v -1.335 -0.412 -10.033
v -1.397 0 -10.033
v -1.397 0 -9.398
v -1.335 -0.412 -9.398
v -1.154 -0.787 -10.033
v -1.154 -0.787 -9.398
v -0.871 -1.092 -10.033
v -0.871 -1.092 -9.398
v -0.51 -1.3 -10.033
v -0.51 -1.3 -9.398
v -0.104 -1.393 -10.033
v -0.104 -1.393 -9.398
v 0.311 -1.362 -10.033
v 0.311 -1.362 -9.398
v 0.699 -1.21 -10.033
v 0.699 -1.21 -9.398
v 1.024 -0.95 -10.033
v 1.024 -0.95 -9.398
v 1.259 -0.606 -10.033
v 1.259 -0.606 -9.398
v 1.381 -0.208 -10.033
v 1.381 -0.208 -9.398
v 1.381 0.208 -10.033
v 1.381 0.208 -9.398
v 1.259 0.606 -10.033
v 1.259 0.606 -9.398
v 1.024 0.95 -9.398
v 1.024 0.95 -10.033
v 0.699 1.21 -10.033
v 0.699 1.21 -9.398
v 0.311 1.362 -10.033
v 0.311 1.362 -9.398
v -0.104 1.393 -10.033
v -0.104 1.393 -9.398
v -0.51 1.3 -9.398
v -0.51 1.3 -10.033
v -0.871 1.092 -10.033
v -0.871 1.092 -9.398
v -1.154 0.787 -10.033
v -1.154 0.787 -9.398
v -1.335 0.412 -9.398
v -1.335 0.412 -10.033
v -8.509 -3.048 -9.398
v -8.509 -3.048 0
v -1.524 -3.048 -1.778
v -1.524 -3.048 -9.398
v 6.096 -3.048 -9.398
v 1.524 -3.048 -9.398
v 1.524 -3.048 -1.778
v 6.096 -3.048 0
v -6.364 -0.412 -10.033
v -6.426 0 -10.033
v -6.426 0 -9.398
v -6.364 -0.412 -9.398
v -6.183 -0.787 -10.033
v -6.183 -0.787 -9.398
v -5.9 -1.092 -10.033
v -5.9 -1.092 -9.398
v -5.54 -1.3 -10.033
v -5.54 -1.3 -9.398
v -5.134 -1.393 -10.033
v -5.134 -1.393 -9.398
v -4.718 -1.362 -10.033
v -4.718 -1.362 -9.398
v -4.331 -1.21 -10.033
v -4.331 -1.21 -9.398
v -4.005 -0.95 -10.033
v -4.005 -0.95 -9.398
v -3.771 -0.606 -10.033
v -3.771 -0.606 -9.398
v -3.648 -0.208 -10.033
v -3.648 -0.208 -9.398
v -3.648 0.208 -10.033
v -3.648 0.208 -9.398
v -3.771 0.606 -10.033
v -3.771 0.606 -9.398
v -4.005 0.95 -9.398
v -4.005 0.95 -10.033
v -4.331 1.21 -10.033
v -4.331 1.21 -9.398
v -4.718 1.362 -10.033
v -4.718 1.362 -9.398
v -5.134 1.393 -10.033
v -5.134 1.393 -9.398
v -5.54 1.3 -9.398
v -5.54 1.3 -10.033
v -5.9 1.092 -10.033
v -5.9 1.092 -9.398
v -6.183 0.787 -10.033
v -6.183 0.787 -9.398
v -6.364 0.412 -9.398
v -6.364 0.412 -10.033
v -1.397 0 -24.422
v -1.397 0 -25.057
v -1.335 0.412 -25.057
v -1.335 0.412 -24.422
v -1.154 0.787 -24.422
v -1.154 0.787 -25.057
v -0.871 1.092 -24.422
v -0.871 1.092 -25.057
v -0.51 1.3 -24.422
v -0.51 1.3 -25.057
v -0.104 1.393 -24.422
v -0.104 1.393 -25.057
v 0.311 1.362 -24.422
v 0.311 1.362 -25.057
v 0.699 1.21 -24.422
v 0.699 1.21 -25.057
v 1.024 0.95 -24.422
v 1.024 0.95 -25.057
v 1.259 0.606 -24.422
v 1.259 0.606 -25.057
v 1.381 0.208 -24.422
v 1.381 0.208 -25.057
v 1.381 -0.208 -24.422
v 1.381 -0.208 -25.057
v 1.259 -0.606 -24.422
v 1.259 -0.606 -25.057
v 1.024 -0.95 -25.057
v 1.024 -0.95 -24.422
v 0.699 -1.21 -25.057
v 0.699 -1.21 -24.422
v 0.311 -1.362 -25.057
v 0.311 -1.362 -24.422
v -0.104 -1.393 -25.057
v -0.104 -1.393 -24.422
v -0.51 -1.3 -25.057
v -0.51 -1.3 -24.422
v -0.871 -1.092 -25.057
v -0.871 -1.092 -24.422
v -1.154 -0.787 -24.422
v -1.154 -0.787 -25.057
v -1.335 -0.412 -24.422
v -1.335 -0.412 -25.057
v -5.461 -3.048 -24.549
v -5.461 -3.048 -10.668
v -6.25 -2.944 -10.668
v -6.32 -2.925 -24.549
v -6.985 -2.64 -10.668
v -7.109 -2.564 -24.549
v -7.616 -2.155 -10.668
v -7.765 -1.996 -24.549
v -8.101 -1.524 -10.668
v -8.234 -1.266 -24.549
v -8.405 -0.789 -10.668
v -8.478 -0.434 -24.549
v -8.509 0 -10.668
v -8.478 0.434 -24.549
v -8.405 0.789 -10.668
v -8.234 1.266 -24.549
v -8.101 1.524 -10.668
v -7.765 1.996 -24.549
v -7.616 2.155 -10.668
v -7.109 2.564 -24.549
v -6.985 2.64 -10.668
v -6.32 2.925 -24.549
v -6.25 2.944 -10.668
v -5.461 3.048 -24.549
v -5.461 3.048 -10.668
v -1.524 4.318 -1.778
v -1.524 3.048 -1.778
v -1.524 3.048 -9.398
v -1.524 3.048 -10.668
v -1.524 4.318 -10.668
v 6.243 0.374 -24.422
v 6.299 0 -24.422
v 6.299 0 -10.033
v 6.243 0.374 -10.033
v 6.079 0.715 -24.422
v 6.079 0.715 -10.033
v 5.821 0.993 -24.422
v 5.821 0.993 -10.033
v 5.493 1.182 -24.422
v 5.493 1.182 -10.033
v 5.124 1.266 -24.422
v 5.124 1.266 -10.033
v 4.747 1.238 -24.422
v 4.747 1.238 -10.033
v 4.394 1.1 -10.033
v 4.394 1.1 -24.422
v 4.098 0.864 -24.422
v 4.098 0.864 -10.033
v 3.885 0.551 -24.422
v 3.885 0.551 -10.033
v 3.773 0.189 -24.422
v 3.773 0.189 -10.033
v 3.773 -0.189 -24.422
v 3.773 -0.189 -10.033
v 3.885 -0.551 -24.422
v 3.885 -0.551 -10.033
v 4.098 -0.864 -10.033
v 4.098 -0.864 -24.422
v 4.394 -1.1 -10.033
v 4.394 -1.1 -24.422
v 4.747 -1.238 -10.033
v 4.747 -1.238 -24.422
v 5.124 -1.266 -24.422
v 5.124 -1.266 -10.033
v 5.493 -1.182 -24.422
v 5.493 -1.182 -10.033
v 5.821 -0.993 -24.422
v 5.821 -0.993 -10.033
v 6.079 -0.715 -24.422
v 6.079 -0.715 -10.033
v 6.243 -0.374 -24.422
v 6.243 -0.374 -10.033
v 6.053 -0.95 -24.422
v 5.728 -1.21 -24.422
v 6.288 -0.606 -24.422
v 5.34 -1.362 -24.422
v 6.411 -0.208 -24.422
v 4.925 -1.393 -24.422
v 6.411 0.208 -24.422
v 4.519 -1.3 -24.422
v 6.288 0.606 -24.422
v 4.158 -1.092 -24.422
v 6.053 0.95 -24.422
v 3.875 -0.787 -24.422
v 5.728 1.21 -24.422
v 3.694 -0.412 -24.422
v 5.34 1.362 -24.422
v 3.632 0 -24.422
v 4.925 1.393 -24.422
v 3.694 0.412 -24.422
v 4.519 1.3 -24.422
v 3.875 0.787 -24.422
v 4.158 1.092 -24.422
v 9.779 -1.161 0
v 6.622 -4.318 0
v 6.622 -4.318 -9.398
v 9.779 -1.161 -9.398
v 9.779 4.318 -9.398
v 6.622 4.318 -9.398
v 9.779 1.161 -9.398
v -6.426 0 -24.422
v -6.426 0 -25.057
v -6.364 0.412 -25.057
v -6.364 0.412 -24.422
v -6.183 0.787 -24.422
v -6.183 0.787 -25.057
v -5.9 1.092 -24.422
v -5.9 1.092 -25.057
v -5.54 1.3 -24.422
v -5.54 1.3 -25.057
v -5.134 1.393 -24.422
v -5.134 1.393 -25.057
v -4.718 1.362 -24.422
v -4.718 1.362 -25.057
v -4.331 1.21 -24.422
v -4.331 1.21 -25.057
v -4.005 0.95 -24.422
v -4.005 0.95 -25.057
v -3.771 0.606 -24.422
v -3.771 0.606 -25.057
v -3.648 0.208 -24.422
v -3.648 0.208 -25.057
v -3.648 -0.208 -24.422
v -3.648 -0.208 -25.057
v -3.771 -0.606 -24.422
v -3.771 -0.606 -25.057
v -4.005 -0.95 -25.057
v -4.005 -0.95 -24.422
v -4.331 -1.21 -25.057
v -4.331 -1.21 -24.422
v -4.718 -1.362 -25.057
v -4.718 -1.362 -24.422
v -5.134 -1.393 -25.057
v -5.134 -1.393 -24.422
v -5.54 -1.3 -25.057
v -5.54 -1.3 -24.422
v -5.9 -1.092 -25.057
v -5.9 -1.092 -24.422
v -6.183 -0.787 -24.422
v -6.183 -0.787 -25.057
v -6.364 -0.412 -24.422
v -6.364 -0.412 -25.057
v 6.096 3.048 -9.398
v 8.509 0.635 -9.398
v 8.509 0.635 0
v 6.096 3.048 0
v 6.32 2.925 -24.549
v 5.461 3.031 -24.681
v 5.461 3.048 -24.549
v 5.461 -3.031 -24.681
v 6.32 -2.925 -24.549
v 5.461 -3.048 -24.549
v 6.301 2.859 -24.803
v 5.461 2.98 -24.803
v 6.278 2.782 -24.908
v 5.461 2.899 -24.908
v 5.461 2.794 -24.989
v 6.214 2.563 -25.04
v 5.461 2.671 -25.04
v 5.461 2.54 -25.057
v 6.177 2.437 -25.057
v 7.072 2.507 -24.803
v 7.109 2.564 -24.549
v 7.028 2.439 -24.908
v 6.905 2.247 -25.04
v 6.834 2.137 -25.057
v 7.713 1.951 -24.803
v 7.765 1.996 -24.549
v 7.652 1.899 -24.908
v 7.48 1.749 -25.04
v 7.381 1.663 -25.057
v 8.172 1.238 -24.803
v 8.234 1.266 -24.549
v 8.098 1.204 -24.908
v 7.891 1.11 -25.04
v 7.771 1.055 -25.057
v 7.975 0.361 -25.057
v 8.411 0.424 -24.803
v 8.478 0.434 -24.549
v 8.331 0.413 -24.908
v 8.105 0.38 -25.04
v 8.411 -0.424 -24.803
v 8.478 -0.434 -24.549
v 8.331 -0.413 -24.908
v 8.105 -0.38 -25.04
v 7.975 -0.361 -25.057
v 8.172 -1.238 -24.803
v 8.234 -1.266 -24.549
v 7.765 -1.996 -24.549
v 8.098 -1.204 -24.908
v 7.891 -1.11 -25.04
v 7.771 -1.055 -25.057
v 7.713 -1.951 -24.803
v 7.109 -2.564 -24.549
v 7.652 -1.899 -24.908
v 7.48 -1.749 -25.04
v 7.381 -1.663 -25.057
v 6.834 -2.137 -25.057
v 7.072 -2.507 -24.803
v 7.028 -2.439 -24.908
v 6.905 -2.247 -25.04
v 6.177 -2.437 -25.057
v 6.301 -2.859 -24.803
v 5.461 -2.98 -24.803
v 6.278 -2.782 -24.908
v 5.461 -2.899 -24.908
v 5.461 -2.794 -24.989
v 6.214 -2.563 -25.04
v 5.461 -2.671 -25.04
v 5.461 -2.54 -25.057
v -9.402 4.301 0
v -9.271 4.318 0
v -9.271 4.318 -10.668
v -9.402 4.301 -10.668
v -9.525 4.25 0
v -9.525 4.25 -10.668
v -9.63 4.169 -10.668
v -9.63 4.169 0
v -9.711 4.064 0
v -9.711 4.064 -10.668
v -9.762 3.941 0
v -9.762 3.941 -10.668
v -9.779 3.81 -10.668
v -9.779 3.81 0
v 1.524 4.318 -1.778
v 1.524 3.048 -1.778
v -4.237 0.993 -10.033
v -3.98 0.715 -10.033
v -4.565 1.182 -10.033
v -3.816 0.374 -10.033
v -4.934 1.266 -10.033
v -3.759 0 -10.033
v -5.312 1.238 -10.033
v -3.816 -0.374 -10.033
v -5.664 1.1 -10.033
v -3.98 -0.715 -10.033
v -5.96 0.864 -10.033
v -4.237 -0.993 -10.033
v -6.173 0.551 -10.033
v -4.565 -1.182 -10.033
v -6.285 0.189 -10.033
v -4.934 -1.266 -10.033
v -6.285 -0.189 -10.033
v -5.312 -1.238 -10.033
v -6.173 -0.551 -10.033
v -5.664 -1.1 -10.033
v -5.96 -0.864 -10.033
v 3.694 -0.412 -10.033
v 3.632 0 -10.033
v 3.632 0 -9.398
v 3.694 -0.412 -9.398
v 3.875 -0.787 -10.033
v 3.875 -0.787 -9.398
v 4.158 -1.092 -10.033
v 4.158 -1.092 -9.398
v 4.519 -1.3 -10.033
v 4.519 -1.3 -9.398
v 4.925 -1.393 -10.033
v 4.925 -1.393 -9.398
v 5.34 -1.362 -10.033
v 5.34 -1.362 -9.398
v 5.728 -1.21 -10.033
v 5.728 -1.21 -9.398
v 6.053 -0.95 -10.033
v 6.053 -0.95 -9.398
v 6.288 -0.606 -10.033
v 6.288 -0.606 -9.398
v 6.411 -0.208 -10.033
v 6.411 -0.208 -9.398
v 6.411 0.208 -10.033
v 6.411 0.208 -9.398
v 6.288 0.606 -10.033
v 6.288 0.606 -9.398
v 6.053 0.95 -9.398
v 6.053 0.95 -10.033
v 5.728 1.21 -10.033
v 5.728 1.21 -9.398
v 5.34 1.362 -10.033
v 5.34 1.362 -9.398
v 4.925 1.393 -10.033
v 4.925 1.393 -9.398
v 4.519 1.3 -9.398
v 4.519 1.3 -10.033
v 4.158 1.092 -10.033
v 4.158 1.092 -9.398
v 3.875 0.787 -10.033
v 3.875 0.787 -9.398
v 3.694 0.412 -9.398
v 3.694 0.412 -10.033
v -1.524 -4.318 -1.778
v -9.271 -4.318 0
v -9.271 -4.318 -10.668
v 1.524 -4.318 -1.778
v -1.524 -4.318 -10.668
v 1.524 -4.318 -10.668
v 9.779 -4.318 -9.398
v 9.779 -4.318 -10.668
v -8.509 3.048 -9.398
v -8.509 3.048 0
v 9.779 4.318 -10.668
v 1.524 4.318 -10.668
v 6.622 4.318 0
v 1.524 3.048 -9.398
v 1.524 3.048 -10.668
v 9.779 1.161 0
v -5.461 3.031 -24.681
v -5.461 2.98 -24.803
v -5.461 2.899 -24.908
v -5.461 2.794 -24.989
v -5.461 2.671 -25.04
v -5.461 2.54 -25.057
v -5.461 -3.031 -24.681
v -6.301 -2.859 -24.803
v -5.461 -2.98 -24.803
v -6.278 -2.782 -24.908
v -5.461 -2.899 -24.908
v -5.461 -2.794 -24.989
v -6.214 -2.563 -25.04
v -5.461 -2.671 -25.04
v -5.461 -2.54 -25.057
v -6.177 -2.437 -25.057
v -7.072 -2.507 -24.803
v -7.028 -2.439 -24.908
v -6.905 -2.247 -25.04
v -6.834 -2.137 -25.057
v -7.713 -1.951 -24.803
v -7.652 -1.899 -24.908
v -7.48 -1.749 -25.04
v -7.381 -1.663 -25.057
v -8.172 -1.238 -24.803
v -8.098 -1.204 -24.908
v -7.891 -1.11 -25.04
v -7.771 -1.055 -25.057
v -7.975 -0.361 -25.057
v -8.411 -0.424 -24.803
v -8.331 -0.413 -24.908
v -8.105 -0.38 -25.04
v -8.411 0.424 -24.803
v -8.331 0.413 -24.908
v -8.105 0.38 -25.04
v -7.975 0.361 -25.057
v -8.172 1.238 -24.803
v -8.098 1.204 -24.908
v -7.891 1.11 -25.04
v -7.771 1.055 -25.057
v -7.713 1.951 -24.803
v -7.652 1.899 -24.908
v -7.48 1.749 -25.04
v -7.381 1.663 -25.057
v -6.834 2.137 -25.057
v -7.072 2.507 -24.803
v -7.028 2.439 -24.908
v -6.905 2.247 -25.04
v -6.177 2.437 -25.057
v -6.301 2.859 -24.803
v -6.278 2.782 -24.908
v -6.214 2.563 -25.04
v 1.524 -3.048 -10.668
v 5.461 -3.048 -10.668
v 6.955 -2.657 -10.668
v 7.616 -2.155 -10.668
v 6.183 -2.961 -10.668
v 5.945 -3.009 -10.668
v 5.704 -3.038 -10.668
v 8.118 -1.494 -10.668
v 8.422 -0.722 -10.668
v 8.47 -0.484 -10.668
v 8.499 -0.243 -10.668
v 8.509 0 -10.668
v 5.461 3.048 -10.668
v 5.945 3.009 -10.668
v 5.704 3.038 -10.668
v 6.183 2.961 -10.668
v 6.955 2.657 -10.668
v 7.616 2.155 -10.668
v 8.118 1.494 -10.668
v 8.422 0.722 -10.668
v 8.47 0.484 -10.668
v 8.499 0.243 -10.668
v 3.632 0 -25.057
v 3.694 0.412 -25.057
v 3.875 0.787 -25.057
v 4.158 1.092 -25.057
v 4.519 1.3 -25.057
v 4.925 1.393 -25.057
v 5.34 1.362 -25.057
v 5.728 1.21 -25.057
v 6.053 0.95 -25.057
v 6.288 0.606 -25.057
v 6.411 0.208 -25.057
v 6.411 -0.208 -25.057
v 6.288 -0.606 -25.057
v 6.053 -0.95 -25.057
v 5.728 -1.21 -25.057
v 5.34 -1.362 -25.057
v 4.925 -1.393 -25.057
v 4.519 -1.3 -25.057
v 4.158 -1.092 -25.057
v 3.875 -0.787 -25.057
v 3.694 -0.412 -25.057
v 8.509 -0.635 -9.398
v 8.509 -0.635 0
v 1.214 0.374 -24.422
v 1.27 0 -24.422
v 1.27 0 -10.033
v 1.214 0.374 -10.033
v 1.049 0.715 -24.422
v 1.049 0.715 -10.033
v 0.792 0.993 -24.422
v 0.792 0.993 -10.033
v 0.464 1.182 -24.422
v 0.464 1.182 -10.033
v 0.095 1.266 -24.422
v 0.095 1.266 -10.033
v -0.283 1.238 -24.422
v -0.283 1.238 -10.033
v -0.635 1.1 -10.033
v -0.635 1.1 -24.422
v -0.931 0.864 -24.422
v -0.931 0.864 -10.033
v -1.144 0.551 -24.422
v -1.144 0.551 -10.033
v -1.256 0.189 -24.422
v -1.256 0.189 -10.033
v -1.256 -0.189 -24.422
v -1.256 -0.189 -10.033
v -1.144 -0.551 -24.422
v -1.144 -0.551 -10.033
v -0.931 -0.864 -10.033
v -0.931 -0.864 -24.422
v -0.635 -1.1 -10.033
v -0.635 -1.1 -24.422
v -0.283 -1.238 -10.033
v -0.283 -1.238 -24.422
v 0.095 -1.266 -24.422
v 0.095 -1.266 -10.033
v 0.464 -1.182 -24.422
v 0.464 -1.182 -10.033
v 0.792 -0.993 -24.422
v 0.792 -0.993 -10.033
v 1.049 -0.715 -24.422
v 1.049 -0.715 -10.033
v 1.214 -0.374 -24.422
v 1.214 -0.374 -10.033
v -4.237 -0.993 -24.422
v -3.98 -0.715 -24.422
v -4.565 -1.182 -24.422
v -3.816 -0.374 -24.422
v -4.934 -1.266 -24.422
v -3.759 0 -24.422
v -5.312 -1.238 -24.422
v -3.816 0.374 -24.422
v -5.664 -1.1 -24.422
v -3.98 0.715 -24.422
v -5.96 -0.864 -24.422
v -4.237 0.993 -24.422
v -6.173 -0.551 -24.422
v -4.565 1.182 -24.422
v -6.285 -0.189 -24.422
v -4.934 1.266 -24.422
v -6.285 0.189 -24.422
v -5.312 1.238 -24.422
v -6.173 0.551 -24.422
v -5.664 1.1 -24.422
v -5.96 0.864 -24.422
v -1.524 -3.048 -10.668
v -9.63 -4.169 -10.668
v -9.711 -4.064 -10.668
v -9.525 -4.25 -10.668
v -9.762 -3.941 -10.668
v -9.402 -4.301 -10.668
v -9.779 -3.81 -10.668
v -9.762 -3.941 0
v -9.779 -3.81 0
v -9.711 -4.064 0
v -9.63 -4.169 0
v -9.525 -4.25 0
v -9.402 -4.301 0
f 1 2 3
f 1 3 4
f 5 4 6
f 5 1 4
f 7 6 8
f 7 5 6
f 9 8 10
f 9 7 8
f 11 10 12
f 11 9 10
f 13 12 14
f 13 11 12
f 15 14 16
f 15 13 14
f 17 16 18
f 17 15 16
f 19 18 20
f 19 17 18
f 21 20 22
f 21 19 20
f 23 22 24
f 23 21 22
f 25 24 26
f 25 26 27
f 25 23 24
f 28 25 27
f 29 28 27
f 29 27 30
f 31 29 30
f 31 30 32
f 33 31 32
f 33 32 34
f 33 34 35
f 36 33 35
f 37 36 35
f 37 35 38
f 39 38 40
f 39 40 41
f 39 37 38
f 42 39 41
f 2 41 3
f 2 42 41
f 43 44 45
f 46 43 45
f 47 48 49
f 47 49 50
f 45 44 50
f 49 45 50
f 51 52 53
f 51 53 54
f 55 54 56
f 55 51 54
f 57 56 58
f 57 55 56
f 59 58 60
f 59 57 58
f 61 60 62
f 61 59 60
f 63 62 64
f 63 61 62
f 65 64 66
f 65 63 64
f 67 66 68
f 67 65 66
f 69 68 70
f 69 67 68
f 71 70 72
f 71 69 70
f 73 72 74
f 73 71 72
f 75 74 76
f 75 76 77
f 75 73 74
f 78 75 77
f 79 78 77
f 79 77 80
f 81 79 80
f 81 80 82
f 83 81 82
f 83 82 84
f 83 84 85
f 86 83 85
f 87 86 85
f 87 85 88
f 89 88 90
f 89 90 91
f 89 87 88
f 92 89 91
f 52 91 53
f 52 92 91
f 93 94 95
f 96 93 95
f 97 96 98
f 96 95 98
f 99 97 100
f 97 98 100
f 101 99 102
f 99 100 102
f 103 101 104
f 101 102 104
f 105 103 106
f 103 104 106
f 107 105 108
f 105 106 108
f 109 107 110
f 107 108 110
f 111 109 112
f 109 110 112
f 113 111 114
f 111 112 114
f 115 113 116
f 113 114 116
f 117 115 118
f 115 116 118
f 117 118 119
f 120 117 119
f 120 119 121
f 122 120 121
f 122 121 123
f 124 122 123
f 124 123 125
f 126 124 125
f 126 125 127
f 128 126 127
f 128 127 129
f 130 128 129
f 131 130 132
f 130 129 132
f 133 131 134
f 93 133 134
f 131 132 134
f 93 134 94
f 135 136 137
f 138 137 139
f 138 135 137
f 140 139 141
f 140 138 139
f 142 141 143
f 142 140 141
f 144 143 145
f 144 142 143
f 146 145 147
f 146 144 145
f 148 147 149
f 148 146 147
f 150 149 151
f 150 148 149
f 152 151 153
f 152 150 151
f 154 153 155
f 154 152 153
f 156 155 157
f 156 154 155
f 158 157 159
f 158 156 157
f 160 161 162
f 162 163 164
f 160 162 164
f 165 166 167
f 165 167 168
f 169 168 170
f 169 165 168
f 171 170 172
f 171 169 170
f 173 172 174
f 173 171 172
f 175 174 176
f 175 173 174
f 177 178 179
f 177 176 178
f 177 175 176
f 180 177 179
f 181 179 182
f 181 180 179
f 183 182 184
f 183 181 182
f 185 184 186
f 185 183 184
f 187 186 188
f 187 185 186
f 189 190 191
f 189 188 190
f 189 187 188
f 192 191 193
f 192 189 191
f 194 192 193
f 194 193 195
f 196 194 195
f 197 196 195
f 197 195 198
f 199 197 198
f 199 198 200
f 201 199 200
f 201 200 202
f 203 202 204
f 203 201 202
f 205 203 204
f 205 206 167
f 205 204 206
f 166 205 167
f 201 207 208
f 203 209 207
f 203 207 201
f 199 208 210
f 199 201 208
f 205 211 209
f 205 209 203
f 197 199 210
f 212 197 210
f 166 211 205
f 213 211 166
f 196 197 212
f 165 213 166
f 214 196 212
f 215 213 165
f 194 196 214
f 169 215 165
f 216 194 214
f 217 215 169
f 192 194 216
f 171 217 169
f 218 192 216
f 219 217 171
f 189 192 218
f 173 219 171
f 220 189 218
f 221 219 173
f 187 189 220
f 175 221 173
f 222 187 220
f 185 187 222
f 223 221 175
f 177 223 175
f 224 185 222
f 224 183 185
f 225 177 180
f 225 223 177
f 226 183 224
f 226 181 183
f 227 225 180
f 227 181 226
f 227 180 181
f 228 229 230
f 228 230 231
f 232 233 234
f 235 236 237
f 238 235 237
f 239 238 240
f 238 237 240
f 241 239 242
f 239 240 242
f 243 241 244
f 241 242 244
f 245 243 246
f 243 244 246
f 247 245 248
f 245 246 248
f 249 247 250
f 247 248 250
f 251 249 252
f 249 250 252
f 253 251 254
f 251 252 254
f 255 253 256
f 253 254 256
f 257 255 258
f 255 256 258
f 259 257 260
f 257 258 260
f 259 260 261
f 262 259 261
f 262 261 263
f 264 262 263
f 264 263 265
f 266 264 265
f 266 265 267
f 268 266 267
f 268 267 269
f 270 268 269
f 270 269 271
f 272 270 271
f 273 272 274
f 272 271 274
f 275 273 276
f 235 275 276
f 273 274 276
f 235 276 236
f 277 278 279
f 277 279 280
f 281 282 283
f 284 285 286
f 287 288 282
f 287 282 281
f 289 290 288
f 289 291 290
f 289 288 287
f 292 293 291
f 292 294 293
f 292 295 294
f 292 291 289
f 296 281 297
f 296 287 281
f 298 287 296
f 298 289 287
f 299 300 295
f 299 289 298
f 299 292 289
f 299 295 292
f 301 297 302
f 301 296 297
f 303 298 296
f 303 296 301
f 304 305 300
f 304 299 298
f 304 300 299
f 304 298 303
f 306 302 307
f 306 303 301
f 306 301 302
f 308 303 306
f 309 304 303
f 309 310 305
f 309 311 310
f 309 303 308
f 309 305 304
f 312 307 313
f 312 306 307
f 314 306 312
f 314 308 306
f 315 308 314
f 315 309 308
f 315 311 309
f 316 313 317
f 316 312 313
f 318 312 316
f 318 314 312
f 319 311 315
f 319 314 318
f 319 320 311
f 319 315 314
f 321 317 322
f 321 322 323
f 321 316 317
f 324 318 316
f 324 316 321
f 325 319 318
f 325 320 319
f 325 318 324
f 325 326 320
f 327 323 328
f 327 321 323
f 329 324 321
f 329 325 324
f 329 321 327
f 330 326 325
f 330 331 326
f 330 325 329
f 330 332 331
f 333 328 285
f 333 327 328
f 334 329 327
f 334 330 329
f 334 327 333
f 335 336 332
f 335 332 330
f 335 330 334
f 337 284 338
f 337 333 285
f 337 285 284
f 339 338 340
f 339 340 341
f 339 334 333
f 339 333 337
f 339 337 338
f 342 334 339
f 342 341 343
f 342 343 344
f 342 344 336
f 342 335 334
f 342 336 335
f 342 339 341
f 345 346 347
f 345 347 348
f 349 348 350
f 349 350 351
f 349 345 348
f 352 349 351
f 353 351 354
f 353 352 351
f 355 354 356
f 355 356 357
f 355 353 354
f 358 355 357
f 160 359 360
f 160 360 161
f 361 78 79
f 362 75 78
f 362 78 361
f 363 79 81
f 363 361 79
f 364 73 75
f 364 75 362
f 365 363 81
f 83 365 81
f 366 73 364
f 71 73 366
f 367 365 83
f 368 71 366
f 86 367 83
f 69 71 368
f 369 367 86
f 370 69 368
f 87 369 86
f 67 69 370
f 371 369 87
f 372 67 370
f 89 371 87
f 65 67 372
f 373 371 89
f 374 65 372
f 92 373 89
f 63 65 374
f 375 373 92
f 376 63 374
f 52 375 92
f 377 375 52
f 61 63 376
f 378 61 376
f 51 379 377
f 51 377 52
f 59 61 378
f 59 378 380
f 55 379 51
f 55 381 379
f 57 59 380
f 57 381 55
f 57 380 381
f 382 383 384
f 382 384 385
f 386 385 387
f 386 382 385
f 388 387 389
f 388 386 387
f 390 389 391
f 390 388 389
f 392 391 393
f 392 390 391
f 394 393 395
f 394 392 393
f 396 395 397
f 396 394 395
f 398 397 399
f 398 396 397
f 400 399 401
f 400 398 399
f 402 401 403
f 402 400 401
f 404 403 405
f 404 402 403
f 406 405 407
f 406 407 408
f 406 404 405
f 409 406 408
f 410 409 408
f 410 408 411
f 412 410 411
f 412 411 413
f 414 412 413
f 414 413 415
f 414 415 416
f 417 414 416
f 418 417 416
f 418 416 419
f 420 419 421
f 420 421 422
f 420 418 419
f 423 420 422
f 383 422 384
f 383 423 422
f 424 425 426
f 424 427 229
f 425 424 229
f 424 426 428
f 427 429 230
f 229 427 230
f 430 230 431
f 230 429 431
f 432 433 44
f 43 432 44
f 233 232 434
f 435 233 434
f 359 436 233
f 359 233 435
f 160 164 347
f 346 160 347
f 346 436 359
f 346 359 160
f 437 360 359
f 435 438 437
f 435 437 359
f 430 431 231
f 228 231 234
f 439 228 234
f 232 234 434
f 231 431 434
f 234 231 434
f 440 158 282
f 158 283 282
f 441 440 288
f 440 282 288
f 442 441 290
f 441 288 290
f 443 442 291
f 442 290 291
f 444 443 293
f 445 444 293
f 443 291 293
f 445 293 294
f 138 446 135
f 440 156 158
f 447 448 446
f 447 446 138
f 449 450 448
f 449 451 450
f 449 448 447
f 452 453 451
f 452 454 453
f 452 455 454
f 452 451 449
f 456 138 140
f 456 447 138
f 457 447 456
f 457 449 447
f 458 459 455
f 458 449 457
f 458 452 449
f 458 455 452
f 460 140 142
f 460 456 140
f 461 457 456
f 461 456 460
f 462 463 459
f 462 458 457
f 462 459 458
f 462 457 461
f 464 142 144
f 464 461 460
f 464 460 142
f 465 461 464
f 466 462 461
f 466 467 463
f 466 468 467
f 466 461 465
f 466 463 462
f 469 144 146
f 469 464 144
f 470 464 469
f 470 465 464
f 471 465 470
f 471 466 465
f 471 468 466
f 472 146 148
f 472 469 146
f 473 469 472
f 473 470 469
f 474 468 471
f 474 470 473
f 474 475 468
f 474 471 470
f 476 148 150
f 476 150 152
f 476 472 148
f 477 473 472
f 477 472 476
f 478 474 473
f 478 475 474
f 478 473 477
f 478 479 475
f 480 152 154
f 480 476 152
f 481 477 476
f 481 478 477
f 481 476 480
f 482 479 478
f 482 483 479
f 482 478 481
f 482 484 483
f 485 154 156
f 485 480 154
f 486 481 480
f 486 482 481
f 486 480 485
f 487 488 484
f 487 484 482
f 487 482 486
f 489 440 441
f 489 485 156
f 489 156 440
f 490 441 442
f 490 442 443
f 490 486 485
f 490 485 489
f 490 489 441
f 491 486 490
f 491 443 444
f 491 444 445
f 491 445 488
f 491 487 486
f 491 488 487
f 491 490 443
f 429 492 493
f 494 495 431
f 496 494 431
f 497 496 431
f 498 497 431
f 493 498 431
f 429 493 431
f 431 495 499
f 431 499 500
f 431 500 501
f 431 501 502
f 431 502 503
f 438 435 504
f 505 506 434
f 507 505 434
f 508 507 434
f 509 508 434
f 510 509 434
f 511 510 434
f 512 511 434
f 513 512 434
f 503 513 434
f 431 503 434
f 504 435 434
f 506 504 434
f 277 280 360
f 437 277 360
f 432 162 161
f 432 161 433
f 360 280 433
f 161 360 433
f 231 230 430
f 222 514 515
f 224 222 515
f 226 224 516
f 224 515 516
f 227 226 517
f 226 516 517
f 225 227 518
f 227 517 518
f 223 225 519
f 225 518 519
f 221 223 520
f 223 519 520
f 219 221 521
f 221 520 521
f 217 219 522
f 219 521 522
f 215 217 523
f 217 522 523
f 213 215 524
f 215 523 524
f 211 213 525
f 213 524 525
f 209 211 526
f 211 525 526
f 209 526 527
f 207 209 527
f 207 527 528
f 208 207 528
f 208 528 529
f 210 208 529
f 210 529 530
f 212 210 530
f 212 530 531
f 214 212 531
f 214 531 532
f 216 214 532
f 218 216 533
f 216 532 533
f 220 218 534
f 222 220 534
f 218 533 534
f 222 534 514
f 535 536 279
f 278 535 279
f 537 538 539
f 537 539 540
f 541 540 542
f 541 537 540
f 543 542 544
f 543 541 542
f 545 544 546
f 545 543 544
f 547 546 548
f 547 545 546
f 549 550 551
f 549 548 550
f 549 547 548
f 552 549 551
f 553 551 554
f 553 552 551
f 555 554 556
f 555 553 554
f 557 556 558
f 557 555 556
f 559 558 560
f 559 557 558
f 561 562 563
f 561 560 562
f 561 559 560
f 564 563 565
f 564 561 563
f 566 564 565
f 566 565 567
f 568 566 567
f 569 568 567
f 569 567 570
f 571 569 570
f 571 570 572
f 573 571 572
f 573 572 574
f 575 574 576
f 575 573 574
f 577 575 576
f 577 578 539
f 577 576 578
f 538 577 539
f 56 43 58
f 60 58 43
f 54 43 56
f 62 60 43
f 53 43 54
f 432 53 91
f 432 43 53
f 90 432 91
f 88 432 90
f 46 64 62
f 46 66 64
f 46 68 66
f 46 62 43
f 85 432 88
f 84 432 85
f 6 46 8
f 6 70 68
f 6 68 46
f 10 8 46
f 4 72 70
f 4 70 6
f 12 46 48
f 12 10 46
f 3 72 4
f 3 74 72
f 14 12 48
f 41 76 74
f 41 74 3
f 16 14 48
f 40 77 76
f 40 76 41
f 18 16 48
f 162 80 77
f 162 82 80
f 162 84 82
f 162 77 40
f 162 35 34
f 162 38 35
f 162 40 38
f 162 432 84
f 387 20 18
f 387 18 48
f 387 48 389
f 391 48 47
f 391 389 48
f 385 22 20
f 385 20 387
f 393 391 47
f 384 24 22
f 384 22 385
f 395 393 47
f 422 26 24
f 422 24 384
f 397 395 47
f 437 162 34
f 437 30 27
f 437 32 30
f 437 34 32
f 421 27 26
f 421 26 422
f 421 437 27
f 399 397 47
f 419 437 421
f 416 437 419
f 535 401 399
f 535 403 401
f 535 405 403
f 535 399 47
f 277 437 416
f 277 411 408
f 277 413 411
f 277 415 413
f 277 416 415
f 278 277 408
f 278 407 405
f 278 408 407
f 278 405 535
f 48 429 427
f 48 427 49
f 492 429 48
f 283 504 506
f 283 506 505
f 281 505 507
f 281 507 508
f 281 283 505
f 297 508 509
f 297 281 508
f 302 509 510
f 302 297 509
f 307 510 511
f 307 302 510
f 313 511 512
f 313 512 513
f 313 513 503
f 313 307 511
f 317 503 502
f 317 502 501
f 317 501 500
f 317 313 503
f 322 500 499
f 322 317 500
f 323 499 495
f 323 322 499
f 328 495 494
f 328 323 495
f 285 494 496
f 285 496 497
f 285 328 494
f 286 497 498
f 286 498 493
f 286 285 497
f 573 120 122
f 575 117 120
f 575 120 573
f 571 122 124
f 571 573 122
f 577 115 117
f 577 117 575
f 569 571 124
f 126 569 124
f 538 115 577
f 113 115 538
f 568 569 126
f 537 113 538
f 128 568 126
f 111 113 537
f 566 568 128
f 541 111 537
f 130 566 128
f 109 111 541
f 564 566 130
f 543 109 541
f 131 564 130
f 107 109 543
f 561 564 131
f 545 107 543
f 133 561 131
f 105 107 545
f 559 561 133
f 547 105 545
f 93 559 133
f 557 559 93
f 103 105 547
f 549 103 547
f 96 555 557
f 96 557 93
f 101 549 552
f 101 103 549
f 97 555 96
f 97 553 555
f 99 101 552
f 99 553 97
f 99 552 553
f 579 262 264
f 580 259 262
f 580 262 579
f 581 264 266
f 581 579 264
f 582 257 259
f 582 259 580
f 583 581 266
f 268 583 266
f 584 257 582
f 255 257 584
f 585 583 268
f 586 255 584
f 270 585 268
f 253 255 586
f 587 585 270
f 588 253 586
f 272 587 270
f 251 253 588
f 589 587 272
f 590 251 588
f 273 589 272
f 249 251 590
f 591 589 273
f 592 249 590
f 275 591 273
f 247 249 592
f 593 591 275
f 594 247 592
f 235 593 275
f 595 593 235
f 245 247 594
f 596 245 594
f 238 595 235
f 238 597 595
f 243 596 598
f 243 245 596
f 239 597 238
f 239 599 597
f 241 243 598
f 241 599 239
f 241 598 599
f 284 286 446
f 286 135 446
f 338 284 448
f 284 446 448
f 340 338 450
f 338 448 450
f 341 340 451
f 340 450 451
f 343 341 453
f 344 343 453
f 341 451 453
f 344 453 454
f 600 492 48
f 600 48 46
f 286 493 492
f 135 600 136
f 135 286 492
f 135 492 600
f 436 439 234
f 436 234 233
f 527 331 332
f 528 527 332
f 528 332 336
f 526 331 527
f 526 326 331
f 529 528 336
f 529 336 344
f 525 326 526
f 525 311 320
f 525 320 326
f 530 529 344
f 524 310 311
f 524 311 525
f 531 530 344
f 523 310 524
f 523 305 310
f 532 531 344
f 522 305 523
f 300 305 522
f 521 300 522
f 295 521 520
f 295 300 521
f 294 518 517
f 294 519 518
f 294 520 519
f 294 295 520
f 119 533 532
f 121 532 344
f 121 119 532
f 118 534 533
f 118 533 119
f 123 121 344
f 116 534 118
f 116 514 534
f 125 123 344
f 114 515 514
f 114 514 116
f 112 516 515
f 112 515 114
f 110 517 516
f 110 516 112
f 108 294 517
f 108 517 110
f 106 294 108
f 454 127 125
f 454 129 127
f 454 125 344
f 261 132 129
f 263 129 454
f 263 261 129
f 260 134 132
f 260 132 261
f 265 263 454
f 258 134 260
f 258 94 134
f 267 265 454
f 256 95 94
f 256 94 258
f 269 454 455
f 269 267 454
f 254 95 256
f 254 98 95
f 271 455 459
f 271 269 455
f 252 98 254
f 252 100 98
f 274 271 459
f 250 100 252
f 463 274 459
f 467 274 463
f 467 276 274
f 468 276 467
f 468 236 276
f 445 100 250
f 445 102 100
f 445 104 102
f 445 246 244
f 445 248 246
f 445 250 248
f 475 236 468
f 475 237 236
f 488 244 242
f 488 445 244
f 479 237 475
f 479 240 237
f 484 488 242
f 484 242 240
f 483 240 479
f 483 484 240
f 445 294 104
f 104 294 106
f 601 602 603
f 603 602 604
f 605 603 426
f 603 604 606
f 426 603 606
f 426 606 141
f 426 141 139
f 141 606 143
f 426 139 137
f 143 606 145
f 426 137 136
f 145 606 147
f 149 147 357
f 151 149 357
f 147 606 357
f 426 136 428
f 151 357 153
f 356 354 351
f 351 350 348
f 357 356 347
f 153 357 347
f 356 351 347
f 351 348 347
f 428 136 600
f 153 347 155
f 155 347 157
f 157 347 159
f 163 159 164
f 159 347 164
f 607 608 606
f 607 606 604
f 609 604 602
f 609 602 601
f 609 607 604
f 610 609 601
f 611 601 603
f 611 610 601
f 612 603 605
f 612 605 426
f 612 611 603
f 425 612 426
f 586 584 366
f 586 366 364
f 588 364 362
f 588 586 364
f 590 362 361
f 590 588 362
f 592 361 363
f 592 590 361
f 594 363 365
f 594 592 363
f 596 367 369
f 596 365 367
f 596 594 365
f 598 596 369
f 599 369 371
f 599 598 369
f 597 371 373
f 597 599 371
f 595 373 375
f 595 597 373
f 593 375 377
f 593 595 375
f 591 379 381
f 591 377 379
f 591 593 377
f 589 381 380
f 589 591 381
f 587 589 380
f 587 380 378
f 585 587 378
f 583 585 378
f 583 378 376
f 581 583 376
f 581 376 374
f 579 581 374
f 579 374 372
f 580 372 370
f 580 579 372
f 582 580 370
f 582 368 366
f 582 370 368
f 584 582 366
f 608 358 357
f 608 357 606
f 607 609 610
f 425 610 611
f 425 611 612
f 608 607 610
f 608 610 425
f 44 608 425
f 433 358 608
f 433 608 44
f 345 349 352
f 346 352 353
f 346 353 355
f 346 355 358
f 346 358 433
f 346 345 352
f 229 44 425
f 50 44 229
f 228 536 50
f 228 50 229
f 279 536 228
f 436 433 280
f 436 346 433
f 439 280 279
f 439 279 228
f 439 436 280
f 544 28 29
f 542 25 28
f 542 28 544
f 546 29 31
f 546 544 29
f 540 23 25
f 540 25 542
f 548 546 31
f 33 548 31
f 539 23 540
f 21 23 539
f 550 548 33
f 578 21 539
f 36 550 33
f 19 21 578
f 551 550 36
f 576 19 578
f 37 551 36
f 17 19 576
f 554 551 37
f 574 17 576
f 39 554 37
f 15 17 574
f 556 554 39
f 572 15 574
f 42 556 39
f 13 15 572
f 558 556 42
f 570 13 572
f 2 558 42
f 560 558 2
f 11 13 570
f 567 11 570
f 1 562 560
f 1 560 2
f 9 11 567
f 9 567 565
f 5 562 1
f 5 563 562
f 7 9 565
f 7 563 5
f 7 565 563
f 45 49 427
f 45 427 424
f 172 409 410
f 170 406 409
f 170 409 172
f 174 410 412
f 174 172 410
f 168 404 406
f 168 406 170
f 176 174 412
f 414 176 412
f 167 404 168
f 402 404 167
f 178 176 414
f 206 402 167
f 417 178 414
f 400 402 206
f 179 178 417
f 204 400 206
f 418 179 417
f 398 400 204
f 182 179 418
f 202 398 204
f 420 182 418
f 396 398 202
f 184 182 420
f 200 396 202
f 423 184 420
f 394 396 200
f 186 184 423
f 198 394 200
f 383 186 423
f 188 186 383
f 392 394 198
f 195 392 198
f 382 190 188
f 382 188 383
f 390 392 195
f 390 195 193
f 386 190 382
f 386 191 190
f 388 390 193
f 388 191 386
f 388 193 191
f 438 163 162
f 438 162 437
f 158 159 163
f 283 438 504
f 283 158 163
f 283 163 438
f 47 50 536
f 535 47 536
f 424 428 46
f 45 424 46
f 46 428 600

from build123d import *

# Parameters (mm, degrees)
BOSS_EXTRUDE1_DEPTH = 10.668
SKETCH2_R           = 1.27
BOSS_EXTRUDE2_DEPTH = 15.6591
BOSS_EXTRUDE3_START = -1.27
BOSS_EXTRUDE3_DEPTH = 1.27
SKETCH4_R           = 1.397
CUT_EXTRUDE1_DEPTH  = 0.635
CUT_EXTRUDE2_START  = -0.635
SKETCH5_R           = 1.397
CUT_EXTRUDE2_DEPTH  = 0.635
SKETCH6_W           = 3.048
SKETCH6_H           = 1.27
CUT_EXTRUDE3_DEPTH  = 8.89
FILLET1_R           = 0.508


# Read off the part's stored shape, not the designer's step: Boss-Extrude3
with BuildPart() as part:
    # Sketch1 → Boss-Extrude1 (new body)
    with BuildSketch(Plane.XY):
        with BuildLine():
            Line((6.622051224, 4.318), (-9.271, 4.318))
            ThreePointArc((-9.271, 4.318), (-9.630210245, 4.169210245), (-9.779, 3.81))
            Line((-9.779, 3.81), (-9.779, -3.81))
            ThreePointArc((-9.779, -3.81), (-9.630210245, -4.169210245), (-9.271, -4.318))
            Line((-9.271, -4.318), (6.622051224, -4.318))
            Line((6.622051224, -4.318), (9.779, -1.161051224))
            Line((9.779, -1.161051224), (9.779, 1.161051224))
            Line((9.779, 1.161051224), (6.622051224, 4.318))
        make_face()
        Polygon((8.509, -0.635), (8.509, 0.635), (6.096, 3.048), (-8.509, 3.048), (-8.509, -3.048), (6.096, -3.048), align=None, mode=Mode.SUBTRACT)
    extrude(amount=-BOSS_EXTRUDE1_DEPTH)



with BuildPart() as body_2:
    # Sketch2 → Boss-Extrude2 (new body)
    with BuildSketch(Plane.XY.offset(-25.0571)):
        with BuildLine():
            Line((-5.461, 3.048), (5.461, 3.048))
            ThreePointArc((5.461, 3.048), (8.509, 0), (5.461, -3.048))
            Line((5.461, -3.048), (-5.461, -3.048))
            ThreePointArc((-5.461, -3.048), (-8.509, 0), (-5.461, 3.048))
        make_face()
        with Locations((-5.0292, 0)):
            Circle(SKETCH2_R, mode=Mode.SUBTRACT)
        with Locations((5.0292, 0)):
            Circle(SKETCH2_R, mode=Mode.SUBTRACT)
        Circle(SKETCH2_R, mode=Mode.SUBTRACT)
    extrude(amount=BOSS_EXTRUDE2_DEPTH)


with BuildPart() as part_1:
    add(part.part)

    add(body_2.part)  # Boss-Extrude3 merges body 2
    # Boss-Extrude3 outline → Boss-Extrude3 (add)
    with BuildSketch(Plane.XY.offset(-9.398).offset(BOSS_EXTRUDE3_START)):
        Polygon((6.622051224, -4.318), (9.779, -4.318), (9.779, -1.161051224), align=None)
        Polygon((6.622051224, 4.318), (9.779, 1.161051224), (9.779, 4.318), align=None)
        with BuildLine():
            Line((5.461, -3.048), (6.096, -3.048))
            Line((6.096, -3.048), (6.182665302, -2.961334698))
            ThreePointArc((6.182665302, -2.961334698), (5.824425262, -3.026256116), (5.461, -3.048))
        make_face()
        with BuildLine():
            ThreePointArc((8.509, 0), (8.487256116, -0.363425262), (8.422334698, -0.721665302))
            Line((8.422334698, -0.721665302), (8.509, -0.635))
            Line((8.509, -0.635), (8.509, 0))
        make_face()
        with BuildLine():
            Line((-8.509, -3.048), (-5.461, -3.048))
            ThreePointArc((-5.461, -3.048), (-7.616261469, -2.155261469), (-8.509, 0))
            Line((-8.509, 0), (-8.509, -3.048))
        make_face()
        with BuildLine():
            ThreePointArc((8.422334698, 0.721665302), (8.487256116, 0.363425262), (8.509, 0))
            Line((8.509, 0), (8.509, 0.635))
            Line((8.509, 0.635), (8.422334698, 0.721665302))
        make_face()
        with BuildLine():
            Line((-8.509, 3.048), (-8.509, 0))
            ThreePointArc((-8.509, 0), (-7.616261469, 2.155261469), (-5.461, 3.048))
            Line((-5.461, 3.048), (-8.509, 3.048))
        make_face()
        with BuildLine():
            ThreePointArc((5.461, 3.048), (5.824425262, 3.026256116), (6.182665302, 2.961334698))
            Line((6.182665302, 2.961334698), (6.096, 3.048))
            Line((6.096, 3.048), (5.461, 3.048))
        make_face()
    extrude(amount=BOSS_EXTRUDE3_DEPTH)

    # Sketch4 → Cut-Extrude1 (cut)
    with BuildSketch(Plane(origin=(0, 0, -25.0571), x_dir=(-1, 0, 0), z_dir=(0, 0, -1))):
        with Locations((-5.0292, 0)):
            Circle(SKETCH4_R)
        with Locations((5.0292, 0)):
            Circle(SKETCH4_R)
        Circle(SKETCH4_R)
    extrude(amount=-CUT_EXTRUDE1_DEPTH, mode=Mode.SUBTRACT)

    # Sketch5 → Cut-Extrude2 (cut)
    with BuildSketch(Plane.XY.offset(-9.398).offset(CUT_EXTRUDE2_START)):
        with Locations(Location((0, 0, 0), (0, 0, 180))):
            Circle(SKETCH5_R)
        with Locations(Location((-5.0292, 0, 0), (0, 0, 180))):
            Circle(SKETCH5_R)
        with Locations(Location((5.0292, 0, 0), (0, 0, 180))):
            Circle(SKETCH5_R)
    extrude(amount=CUT_EXTRUDE2_DEPTH, mode=Mode.SUBTRACT)

    # Sketch6 → Cut-Extrude3 (cut)
    with BuildSketch(Plane(origin=(0, 0, -10.668), x_dir=(-1, 0, 0), z_dir=(0, 0, -1))):
        with Locations((0, 3.683)):
            Rectangle(SKETCH6_W, SKETCH6_H)
        with Locations((0, -3.683)):
            Rectangle(SKETCH6_W, SKETCH6_H)
    extrude(amount=-CUT_EXTRUDE3_DEPTH, mode=Mode.SUBTRACT)

    # Fillet1
    fillet1_edges = [part_1.edges().sort_by_distance(p)[0] for p in [
        (-8.509, 0, -25.0571),
        (0, 3.048, -25.0571),
        (0, -3.048, -25.0571),
        (8.509, 0, -25.0571),
    ]]
    fillet(fillet1_edges, radius=FILLET1_R)


solid = part_1.part
